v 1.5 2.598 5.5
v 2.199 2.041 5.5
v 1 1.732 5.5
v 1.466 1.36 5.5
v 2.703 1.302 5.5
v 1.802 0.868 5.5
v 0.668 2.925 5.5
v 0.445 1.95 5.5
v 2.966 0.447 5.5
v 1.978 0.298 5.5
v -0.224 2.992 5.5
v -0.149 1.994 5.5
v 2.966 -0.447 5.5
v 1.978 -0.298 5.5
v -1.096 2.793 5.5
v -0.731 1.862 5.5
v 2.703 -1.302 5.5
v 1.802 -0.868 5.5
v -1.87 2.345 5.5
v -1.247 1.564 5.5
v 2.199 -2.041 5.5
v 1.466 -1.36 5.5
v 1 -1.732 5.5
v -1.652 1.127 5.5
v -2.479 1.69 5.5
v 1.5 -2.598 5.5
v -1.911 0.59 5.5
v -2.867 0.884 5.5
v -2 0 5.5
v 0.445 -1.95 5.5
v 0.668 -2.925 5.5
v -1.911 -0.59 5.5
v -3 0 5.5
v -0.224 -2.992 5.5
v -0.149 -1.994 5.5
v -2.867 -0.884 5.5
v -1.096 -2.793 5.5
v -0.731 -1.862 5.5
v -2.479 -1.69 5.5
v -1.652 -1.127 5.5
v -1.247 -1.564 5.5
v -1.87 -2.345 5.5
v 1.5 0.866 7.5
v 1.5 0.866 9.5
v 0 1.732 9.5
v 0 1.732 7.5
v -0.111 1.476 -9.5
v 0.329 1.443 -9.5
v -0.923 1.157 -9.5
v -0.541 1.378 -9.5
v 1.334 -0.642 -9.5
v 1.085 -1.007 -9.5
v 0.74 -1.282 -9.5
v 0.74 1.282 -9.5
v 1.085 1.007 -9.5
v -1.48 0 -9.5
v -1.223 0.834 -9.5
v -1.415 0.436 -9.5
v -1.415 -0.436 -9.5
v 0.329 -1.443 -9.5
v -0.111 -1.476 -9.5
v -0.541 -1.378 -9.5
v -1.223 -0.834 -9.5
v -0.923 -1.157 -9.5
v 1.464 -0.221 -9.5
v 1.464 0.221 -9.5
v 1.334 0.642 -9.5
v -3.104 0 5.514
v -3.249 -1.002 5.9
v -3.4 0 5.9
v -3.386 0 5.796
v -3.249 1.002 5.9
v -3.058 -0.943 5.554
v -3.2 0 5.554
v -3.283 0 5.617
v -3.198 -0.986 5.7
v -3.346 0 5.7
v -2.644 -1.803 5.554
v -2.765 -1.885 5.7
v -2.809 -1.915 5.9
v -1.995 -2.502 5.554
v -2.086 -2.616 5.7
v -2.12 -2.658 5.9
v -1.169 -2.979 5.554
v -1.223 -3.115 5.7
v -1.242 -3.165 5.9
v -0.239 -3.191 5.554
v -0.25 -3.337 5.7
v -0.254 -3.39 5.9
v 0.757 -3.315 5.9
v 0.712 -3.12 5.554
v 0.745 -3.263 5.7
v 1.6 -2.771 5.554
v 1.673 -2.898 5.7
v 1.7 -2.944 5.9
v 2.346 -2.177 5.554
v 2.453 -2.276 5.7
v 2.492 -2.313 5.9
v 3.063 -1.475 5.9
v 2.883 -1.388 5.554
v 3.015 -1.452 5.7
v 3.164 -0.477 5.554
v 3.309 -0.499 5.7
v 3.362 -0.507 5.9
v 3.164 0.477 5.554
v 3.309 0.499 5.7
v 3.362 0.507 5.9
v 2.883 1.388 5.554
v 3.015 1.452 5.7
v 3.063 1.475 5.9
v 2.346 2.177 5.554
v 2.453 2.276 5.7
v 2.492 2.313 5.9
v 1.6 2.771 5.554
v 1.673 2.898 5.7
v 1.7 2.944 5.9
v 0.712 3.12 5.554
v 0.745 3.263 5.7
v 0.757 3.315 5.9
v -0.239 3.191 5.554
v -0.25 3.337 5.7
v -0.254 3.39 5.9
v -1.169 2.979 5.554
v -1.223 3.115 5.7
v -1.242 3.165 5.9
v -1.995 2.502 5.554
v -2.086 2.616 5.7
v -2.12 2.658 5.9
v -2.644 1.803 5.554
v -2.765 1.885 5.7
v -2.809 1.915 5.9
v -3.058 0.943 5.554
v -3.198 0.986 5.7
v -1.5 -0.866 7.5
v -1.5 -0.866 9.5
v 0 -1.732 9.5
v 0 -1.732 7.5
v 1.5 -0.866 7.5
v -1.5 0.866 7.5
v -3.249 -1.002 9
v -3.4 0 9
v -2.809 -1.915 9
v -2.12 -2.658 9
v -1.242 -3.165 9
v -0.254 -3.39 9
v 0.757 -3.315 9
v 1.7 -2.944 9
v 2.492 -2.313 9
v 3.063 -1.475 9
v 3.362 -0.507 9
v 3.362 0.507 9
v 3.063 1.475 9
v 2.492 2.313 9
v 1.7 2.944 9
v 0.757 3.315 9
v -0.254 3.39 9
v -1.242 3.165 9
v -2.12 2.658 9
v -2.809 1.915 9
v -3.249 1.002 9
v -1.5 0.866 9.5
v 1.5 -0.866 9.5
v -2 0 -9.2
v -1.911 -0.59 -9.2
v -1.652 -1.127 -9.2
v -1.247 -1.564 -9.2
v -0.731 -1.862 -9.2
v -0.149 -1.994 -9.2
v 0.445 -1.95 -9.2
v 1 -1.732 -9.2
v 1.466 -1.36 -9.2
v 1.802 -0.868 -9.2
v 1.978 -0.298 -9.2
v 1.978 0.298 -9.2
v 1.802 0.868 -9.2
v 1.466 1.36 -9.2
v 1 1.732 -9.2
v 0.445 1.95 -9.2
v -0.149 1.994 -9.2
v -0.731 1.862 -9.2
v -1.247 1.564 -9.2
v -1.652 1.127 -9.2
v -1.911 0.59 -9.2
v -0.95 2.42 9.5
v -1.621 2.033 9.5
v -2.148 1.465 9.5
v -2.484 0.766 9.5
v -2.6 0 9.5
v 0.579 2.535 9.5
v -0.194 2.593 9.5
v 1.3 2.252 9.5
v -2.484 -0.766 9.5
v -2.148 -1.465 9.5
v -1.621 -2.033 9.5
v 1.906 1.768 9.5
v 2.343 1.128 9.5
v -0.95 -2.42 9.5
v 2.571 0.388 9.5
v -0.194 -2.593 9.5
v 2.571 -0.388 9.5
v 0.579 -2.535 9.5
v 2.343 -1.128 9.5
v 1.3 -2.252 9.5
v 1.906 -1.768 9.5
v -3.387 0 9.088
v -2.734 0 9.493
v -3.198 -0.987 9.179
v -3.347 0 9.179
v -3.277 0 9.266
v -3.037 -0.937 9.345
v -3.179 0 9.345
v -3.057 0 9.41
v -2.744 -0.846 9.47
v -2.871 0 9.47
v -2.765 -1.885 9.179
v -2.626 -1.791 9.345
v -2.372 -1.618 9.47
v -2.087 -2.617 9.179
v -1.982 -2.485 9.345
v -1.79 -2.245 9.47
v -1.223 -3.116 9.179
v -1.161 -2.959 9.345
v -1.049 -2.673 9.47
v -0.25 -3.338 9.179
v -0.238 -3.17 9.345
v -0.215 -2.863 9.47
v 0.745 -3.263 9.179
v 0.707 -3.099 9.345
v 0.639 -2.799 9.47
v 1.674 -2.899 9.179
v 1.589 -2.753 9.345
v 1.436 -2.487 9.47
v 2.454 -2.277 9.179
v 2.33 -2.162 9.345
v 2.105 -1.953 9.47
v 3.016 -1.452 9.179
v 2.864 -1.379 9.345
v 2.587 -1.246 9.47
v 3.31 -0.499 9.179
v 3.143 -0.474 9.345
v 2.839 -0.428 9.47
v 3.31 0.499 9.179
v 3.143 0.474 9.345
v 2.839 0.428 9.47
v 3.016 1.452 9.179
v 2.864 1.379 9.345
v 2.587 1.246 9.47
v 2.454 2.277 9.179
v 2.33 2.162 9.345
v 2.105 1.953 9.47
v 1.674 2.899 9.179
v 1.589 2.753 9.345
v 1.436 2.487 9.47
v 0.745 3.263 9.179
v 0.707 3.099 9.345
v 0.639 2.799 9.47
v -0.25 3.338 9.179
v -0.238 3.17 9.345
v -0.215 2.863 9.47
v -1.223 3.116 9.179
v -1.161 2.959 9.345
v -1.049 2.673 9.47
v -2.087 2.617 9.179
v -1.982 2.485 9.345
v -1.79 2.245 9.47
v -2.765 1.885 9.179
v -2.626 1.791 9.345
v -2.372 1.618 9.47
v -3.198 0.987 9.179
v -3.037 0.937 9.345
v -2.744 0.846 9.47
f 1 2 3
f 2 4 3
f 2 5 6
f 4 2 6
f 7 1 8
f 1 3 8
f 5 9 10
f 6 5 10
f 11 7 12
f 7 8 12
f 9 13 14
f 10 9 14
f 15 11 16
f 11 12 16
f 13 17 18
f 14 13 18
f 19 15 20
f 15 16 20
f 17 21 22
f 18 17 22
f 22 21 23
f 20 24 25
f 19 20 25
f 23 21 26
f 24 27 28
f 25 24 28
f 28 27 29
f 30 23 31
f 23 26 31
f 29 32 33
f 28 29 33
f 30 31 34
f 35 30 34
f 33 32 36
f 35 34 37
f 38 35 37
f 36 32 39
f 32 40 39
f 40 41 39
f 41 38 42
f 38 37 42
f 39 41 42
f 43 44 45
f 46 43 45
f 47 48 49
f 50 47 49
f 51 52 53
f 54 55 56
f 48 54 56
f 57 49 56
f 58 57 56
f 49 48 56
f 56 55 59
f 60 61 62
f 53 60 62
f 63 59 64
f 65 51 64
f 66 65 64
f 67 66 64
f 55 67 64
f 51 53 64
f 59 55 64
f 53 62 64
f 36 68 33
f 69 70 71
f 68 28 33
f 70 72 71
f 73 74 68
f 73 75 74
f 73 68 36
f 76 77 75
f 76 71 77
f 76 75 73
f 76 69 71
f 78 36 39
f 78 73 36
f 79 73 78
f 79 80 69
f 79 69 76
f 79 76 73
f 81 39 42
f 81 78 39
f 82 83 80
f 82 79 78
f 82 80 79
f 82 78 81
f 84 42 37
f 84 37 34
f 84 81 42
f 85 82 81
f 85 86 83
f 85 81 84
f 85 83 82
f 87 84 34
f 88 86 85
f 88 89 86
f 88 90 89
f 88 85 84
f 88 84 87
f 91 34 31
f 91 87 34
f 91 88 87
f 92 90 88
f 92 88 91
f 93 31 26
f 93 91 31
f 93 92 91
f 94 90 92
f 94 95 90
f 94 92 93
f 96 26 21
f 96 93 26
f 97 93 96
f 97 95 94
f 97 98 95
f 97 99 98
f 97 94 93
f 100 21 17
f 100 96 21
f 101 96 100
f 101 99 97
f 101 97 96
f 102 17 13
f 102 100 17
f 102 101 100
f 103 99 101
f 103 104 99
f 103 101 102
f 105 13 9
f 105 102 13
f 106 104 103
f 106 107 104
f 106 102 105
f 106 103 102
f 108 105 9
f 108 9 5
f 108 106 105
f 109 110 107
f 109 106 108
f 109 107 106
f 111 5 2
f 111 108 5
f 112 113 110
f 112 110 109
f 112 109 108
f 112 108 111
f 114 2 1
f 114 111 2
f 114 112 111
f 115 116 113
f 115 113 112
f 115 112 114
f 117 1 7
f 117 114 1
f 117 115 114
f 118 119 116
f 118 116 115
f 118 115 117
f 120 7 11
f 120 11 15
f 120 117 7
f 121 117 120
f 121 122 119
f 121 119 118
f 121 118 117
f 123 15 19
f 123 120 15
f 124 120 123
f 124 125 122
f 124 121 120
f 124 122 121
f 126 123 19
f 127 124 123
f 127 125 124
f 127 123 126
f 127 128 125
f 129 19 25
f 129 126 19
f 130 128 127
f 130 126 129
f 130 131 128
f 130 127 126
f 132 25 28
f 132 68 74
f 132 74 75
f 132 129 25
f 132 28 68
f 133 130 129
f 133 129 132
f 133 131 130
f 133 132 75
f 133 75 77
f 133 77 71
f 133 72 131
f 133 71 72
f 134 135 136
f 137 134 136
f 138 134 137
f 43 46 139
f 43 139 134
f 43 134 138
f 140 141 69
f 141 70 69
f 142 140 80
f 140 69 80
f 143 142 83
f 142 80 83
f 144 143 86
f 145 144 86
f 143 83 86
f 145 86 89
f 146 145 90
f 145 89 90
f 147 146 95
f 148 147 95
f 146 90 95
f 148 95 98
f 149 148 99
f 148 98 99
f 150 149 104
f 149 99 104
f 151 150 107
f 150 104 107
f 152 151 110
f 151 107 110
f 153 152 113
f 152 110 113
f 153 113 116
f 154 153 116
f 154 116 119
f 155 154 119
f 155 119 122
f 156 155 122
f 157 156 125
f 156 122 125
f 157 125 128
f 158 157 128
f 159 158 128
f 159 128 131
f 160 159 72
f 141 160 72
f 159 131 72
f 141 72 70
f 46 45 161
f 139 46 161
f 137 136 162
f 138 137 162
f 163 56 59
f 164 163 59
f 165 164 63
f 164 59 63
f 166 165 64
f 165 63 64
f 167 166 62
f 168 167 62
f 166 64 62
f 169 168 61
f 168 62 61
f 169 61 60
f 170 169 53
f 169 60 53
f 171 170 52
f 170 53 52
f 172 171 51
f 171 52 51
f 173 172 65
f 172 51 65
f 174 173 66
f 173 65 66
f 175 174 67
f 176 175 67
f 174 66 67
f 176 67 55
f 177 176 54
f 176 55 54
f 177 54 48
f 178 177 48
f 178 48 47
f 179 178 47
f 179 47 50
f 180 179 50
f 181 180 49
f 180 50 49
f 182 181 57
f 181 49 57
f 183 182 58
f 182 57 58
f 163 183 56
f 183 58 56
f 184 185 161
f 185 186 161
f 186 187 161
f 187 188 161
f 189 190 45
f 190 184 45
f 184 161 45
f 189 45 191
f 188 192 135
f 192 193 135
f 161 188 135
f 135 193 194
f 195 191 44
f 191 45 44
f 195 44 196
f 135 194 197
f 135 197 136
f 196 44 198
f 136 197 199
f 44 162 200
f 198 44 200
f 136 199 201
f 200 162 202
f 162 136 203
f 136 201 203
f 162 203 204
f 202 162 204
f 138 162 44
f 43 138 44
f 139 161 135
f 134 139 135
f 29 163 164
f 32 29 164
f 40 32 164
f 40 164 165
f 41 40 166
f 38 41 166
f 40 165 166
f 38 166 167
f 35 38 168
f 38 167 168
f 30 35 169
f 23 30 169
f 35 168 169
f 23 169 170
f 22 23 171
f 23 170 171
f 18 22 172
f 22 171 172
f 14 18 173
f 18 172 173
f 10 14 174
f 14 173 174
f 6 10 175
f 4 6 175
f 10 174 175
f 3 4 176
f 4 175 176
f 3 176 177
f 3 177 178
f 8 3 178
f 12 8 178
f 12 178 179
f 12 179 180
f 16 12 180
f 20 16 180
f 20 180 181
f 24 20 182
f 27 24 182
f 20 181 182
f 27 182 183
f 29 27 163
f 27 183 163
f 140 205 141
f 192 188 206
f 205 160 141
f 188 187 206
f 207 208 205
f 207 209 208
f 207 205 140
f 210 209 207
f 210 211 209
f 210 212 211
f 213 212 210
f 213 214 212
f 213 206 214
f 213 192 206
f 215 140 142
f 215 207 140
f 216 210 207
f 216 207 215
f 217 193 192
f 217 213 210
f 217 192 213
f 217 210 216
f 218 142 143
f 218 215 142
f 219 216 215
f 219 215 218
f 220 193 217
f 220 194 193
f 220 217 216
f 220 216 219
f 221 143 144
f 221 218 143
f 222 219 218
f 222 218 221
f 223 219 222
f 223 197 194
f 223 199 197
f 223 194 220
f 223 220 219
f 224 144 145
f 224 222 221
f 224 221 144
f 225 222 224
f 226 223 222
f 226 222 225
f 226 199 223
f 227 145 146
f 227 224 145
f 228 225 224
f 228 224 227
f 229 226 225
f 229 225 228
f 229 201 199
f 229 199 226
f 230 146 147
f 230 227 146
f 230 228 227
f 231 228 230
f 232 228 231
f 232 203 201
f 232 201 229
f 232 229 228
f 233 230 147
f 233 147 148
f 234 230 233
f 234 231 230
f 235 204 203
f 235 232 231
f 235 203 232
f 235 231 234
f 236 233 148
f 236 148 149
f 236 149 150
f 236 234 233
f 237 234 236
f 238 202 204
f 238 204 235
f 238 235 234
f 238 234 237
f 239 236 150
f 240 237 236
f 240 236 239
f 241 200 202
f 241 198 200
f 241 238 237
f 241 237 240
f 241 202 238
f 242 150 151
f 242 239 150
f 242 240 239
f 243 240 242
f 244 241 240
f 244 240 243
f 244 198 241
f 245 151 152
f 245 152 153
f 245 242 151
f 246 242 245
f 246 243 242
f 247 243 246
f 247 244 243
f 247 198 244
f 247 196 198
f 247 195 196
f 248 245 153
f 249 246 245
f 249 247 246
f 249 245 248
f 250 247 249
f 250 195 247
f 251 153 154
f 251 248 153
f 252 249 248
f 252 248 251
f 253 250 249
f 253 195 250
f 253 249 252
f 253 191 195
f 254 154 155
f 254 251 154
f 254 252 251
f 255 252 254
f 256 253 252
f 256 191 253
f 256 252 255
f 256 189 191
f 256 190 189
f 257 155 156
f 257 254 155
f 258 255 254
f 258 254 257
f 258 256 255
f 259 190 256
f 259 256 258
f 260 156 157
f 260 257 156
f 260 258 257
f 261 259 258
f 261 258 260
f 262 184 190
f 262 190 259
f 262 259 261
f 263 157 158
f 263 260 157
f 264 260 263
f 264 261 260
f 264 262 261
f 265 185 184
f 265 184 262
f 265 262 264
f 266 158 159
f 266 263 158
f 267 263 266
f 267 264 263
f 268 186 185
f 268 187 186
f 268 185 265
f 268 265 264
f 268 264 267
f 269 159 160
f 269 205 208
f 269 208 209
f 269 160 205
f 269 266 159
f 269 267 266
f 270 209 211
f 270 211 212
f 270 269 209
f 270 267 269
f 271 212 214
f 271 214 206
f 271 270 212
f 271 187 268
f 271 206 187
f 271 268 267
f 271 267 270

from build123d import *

# Parameters (mm, degrees)
CHAMFER_1_SIZE      = 0.3
CHAMFER_1_SIZE2     = 0.519615242
FILLET_1_R          = 0.4
FILLET_2_SIZE       = 0.5
FILLET_2_SIZE_2     = 0.8
CUT_EXTRUDE_1_DEPTH = 2


with BuildPart() as part:
    # 草图2 → 旋转1 (revolve)
    with BuildSketch(Plane(origin=(0, 0, 0), x_dir=(0, 0, -1), z_dir=(1, 0, 0)), mode=Mode.PRIVATE) as revolve_1_sk:
        Polygon((-9.5, 0), (-9.5, 3.4), (-5.5, 3.4), (-5.5, 2), (9.5, 2), (9.5, 0), align=None)
    revolve(revolve_1_sk.sketch.rotate(Axis((0, 0, -9.5), (0, 0, 1)), 90), axis=Axis((0, 0, -9.5), (0, 0, 1)))

    # 倒角1
    chamfer_1_edges = [part.edges().sort_by_distance(p)[0] for p in [
        (2, 0, -9.5),
    ]]
    chamfer_1_side = [part.faces().sort_by_distance(p)[0] for p in [
        (2, 0, -2),
    ]]
    chamfer(chamfer_1_edges, length=CHAMFER_1_SIZE, length2=CHAMFER_1_SIZE2, reference=chamfer_1_side[0])

    # 圆角1
    fillet_1_edges = [part.edges().sort_by_distance(p)[0] for p in [
        (3.4, 0, 5.5),
    ]]
    fillet(fillet_1_edges, radius=FILLET_1_R)

    # 圆角2
    # an asymmetric fillet: 0.8, 0.5 mm, written as the material it takes off along each edge
    with BuildSketch(Plane(origin=(0, 0, 9.5), x_dir=(-1, 0, 0), z_dir=(0, 1, 0))) as fillet_2_piece_1:
        with BuildLine():
            Bezier((3.4, -FILLET_2_SIZE), (3.4, 0), (3.4 - FILLET_2_SIZE_2, 0), weights=[1, 0.707106781, 1])
            Line((3.4 - FILLET_2_SIZE_2, 0), (3.4, 0))
            Line((3.4, 0), (3.4, -FILLET_2_SIZE))
        make_face()
    revolve(axis=Axis((0, 0, 9.5), (0, 0, 1)), mode=Mode.SUBTRACT)

    # 草图3 → 切除-拉伸1 (cut)
    with BuildSketch(Plane.XY.offset(9.5)):
        Polygon((0, 1.732050808), (-1.5, 0.866025404), (-1.5, -0.866025404), (0, -1.732050808), (1.5, -0.866025404), (1.5, 0.866025404), align=None)
    extrude(amount=-CUT_EXTRUDE_1_DEPTH, mode=Mode.SUBTRACT)


solid = part.part
